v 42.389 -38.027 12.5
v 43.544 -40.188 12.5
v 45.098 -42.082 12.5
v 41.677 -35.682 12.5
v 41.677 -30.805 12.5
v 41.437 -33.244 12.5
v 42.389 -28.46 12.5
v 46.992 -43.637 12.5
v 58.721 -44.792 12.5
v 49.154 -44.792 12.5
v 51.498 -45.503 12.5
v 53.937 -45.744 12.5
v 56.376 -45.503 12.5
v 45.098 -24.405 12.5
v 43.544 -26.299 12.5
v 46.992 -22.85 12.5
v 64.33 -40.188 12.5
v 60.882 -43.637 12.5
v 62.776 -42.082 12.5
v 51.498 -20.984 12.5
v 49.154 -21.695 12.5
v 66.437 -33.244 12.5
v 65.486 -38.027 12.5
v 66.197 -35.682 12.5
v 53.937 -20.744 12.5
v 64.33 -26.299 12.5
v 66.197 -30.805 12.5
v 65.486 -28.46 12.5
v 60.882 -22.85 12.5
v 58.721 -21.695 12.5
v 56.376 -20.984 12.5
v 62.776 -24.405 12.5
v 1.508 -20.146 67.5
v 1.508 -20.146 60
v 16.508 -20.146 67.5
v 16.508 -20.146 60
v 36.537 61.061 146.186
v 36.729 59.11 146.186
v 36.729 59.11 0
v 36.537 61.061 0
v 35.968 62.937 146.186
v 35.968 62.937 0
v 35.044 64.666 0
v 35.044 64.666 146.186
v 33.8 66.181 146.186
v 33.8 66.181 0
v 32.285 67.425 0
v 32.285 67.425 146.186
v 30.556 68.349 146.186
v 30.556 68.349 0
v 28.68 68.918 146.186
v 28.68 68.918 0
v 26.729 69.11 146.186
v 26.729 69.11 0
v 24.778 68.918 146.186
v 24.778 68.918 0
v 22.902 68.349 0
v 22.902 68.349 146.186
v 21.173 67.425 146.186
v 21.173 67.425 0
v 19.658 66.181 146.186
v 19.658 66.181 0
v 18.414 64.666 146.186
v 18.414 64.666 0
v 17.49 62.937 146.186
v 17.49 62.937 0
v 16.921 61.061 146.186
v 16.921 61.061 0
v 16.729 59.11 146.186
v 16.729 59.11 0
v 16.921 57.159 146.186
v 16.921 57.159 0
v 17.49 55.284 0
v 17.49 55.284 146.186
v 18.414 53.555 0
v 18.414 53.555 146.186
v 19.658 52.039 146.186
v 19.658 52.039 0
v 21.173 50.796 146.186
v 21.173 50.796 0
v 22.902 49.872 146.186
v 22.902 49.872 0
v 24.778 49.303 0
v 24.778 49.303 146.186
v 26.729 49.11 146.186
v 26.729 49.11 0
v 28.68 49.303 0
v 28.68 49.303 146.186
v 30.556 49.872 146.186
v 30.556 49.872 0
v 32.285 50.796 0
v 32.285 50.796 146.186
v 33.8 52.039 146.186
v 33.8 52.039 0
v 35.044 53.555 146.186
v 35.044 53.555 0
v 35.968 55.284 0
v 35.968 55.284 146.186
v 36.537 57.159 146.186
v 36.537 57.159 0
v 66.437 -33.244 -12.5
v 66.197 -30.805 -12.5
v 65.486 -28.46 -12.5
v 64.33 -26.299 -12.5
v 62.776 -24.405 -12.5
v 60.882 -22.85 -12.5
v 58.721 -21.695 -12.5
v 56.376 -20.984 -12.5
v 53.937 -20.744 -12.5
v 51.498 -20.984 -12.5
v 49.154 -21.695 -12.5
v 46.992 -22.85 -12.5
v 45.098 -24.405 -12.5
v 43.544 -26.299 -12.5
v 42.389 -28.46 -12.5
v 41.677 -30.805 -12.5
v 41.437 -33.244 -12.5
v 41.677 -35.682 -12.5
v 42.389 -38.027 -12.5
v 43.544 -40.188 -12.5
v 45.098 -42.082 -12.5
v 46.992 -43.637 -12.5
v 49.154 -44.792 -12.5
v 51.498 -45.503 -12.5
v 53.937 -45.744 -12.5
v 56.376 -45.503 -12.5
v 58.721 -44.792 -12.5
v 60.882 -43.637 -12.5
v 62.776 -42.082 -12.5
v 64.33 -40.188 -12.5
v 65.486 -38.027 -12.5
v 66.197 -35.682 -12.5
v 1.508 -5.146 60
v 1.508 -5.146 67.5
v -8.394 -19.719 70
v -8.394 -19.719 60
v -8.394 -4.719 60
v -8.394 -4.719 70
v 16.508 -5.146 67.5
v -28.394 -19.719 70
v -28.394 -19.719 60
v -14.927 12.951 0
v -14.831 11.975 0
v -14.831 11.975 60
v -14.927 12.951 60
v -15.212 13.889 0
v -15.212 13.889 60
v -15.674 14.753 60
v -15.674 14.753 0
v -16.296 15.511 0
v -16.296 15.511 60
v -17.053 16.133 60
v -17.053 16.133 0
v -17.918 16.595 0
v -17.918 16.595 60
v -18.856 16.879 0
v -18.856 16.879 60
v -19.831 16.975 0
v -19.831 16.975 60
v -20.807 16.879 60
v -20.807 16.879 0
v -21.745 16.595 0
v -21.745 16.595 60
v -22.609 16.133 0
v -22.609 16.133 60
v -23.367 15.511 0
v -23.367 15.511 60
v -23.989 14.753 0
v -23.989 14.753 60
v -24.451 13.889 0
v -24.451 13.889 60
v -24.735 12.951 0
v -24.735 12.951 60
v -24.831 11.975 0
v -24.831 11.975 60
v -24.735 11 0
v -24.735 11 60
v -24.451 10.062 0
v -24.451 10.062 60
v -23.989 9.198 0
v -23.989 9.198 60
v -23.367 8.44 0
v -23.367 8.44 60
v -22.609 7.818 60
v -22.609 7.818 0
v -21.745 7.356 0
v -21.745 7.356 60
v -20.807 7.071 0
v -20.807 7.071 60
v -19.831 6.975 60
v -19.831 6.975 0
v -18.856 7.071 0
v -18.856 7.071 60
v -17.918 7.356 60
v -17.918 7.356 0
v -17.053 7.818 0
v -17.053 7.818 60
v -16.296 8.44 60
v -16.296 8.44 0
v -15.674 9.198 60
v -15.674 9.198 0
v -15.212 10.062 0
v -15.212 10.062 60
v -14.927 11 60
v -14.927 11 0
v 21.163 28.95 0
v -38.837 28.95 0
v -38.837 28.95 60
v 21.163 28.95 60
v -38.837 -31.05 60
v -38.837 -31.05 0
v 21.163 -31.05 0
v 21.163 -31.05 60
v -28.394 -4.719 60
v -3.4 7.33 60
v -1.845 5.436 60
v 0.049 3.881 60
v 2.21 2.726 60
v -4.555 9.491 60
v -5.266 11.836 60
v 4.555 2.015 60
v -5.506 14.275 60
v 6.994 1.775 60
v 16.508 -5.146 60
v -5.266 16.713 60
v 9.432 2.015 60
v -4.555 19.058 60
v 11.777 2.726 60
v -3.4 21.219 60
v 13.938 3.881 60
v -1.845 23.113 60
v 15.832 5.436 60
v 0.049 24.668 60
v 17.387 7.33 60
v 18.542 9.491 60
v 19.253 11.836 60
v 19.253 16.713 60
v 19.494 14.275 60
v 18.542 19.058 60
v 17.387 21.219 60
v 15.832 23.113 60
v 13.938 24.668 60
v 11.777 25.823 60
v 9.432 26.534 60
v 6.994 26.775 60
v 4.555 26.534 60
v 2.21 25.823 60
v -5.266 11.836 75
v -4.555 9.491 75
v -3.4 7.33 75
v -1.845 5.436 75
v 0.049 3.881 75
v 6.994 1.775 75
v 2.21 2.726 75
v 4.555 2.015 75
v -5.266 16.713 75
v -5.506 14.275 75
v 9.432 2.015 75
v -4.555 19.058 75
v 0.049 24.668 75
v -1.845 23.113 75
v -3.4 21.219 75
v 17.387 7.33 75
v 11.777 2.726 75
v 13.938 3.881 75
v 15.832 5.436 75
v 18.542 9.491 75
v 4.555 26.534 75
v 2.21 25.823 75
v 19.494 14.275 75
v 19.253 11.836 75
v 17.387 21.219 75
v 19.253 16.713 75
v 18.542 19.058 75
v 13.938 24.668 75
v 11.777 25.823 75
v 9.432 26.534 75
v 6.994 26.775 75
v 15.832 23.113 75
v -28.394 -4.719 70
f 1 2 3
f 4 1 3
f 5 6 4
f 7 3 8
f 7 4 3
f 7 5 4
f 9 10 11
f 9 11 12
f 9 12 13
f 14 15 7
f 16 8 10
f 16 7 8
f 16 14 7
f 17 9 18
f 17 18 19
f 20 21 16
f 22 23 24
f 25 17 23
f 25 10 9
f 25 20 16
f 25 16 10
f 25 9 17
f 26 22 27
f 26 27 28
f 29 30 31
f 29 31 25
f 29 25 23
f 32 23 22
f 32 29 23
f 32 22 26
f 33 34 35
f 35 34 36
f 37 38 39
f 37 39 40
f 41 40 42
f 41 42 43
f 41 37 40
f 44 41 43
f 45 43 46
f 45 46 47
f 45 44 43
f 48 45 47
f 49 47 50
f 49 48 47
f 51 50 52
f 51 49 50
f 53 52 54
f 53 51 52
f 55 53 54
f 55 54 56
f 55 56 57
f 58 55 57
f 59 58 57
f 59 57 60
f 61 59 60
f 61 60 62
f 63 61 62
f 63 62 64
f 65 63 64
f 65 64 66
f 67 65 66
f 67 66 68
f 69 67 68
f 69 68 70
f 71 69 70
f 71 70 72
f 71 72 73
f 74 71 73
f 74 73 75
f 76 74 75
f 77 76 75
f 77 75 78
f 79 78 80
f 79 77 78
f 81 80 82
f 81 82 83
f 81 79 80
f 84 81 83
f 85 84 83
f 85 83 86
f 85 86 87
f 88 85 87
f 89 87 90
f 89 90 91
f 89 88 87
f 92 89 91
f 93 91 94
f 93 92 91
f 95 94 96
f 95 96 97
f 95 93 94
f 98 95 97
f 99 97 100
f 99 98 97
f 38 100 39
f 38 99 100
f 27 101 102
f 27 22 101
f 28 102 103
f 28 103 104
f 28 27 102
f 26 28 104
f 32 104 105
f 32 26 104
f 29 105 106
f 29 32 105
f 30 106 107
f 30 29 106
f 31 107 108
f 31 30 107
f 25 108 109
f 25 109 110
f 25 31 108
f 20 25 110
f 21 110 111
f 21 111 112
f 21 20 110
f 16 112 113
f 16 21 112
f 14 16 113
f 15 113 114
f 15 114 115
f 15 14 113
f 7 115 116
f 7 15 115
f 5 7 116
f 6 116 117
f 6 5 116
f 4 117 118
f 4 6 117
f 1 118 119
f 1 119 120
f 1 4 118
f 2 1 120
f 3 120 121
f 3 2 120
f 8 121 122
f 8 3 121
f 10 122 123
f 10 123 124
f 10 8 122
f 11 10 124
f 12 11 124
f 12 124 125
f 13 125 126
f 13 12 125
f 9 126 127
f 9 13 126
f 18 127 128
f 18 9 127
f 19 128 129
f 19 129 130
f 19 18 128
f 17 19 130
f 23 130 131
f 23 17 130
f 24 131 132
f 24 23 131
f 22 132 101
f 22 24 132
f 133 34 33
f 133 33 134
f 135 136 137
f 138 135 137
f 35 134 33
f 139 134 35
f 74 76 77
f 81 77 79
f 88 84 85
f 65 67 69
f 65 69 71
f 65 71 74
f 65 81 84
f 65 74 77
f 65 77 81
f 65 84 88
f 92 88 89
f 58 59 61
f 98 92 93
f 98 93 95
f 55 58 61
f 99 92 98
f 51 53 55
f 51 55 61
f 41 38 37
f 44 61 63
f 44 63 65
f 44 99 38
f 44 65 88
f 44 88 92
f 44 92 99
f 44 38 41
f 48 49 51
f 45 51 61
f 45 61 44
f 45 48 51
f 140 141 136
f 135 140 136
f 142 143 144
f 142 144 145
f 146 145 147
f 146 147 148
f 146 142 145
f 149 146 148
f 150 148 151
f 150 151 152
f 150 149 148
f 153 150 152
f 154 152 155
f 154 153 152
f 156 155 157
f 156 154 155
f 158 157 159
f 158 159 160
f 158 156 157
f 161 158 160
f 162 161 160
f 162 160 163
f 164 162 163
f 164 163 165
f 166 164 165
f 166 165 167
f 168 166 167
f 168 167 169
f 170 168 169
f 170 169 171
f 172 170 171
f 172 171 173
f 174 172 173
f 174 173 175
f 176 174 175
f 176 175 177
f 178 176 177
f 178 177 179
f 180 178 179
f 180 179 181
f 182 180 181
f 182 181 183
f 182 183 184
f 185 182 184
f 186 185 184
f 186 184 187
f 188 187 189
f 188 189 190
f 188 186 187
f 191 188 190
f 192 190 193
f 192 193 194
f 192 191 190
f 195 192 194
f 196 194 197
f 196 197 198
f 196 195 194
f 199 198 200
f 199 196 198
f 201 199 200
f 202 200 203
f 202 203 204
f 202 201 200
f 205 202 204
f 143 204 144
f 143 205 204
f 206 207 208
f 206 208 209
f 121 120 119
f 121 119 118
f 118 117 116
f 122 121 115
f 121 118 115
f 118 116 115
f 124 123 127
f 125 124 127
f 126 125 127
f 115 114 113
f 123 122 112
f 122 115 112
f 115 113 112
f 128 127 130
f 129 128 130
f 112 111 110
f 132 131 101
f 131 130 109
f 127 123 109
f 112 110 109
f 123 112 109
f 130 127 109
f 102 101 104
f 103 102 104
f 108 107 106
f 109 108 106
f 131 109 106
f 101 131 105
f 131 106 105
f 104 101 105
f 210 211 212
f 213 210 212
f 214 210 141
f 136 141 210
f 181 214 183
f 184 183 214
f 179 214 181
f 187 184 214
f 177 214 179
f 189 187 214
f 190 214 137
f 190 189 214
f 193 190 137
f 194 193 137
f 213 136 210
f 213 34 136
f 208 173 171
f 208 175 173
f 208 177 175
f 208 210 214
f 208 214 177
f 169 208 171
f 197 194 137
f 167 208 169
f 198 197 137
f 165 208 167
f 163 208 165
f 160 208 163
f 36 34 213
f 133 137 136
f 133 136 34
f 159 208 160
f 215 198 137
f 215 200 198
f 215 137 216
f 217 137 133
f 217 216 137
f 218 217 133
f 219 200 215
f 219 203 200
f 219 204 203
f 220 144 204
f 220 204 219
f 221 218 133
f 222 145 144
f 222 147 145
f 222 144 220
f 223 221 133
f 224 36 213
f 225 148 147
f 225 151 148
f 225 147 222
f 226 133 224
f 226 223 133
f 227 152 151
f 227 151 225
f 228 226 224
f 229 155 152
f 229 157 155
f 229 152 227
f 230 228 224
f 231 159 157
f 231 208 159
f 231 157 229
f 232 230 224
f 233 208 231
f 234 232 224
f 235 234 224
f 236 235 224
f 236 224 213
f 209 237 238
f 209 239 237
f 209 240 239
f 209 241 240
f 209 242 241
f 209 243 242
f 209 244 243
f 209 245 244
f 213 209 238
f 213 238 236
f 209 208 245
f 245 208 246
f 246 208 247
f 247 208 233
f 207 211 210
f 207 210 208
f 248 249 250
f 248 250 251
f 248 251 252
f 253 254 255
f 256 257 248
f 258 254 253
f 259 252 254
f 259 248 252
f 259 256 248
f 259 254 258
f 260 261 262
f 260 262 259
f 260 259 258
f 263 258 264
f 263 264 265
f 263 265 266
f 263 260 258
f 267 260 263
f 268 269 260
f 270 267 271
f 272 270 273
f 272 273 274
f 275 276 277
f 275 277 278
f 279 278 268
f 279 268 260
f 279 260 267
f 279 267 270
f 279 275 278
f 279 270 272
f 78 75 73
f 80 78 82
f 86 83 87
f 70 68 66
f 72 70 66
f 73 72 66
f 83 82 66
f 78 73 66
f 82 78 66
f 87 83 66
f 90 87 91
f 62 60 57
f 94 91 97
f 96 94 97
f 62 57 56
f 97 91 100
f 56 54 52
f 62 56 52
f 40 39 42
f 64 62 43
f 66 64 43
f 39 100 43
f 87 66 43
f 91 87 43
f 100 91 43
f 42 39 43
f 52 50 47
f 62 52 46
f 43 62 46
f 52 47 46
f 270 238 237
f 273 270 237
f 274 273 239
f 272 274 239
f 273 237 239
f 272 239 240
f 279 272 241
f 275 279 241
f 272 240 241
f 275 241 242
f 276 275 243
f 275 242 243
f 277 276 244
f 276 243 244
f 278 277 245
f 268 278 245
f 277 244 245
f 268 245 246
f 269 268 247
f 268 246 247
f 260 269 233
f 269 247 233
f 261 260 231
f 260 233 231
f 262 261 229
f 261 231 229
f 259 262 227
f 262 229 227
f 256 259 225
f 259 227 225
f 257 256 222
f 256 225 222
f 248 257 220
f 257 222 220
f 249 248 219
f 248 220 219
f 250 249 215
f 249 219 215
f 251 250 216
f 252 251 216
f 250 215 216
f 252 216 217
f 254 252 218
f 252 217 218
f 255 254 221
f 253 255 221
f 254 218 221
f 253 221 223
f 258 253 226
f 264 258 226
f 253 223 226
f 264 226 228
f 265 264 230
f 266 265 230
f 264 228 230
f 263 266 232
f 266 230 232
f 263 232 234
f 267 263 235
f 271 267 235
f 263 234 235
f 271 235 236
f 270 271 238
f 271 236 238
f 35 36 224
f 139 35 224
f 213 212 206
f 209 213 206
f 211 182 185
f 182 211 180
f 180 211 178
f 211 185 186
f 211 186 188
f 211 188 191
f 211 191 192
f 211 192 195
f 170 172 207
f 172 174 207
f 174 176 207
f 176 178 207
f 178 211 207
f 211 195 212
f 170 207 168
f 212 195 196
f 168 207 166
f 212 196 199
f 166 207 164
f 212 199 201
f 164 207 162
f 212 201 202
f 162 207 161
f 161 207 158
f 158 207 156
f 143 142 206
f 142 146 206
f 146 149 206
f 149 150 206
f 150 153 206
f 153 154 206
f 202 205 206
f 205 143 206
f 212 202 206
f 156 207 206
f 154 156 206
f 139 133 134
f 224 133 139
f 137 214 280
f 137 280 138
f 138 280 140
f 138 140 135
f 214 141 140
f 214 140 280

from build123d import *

# Parameters (mm, degrees)
F0_W      = 60
F0_H      = 60
F0_R      = 5
F1_DEPTH  = 60
F2_DEPTH  = 25
F3_W      = 20
F3_H      = 15
F4_DEPTH  = 10
F5_W      = 15
F5_H      = 15
F6_DEPTH  = 7.5
F7_R      = 12.5
F8_DEPTH  = 15
F9_R      = 10
F10_DEPTH = 75.001
F11_R     = 12.5
F12_DEPTH = 12.5


# Not quite as in the source:
# - a pattern or mirror of a feature is missing from the dataset's text; its kind, count and spacing are read off the source's solid


with BuildPart() as f1:
    # F0 (on Top) → F1 (new body)
    with BuildSketch(Plane.XY):
        with Locations((-8.8369709253, -1.0501102358)):
            Rectangle(F0_W, F0_H)
        with Locations((-19.8312066495, 11.9753647596)):
            Circle(F0_R, mode=Mode.SUBTRACT)
    extrude(amount=F1_DEPTH)

    # F0 (on Top) → F2 (join)
    with BuildSketch(Plane.XY):
        with Locations((-8.8369709253, -1.0501102358)):
            Rectangle(F0_W, F0_H)
        with Locations((-19.8312066495, 11.9753647596)):
            Circle(F0_R, mode=Mode.SUBTRACT)
    extrude(amount=F2_DEPTH)

    # F3 (on face) → F4 (join)
    with BuildSketch(Plane.XY.offset(60)):
        with Locations((-18.3941614814, -12.2192362325)):
            Rectangle(F3_W, F3_H)
    extrude(amount=F4_DEPTH)

    # F5 (on face) → F6 (join)
    with BuildSketch(Plane.XY.offset(60)):
        with Locations((9.0080741116, -12.6459863968)):
            Rectangle(F5_W, F5_H)
    extrude(amount=F6_DEPTH)

    # F7 (on face) → F8 (join)
    with BuildSketch(Plane.XY.offset(60)):
        with Locations((6.9936127402, 14.2746353522)):
            Circle(F7_R)
    extrude(amount=F8_DEPTH)


with BuildPart() as f10:
    # F9 (on Top) → F10 (new body, through all)
    with BuildSketch(Plane.XY):
        with Locations((26.7290174961, 59.1104030609)):
            Circle(F9_R)
    extrude(amount=F10_DEPTH)

    # F10_copies: F10 across plane


with BuildPart() as f10_1:
    add(f10.part)
    add(f10.part.mirror(Plane.XY.offset(73.09287)))


with BuildPart() as f12:
    # F11 (on Top) → F12 (new body, symmetric)
    with BuildSketch(Plane.XY):
        with Locations((53.93704772, -33.2436151803)):
            Circle(F11_R)
    extrude(amount=F12_DEPTH, both=True)


solid = Compound([f1.part, f10_1.part, f12.part])
